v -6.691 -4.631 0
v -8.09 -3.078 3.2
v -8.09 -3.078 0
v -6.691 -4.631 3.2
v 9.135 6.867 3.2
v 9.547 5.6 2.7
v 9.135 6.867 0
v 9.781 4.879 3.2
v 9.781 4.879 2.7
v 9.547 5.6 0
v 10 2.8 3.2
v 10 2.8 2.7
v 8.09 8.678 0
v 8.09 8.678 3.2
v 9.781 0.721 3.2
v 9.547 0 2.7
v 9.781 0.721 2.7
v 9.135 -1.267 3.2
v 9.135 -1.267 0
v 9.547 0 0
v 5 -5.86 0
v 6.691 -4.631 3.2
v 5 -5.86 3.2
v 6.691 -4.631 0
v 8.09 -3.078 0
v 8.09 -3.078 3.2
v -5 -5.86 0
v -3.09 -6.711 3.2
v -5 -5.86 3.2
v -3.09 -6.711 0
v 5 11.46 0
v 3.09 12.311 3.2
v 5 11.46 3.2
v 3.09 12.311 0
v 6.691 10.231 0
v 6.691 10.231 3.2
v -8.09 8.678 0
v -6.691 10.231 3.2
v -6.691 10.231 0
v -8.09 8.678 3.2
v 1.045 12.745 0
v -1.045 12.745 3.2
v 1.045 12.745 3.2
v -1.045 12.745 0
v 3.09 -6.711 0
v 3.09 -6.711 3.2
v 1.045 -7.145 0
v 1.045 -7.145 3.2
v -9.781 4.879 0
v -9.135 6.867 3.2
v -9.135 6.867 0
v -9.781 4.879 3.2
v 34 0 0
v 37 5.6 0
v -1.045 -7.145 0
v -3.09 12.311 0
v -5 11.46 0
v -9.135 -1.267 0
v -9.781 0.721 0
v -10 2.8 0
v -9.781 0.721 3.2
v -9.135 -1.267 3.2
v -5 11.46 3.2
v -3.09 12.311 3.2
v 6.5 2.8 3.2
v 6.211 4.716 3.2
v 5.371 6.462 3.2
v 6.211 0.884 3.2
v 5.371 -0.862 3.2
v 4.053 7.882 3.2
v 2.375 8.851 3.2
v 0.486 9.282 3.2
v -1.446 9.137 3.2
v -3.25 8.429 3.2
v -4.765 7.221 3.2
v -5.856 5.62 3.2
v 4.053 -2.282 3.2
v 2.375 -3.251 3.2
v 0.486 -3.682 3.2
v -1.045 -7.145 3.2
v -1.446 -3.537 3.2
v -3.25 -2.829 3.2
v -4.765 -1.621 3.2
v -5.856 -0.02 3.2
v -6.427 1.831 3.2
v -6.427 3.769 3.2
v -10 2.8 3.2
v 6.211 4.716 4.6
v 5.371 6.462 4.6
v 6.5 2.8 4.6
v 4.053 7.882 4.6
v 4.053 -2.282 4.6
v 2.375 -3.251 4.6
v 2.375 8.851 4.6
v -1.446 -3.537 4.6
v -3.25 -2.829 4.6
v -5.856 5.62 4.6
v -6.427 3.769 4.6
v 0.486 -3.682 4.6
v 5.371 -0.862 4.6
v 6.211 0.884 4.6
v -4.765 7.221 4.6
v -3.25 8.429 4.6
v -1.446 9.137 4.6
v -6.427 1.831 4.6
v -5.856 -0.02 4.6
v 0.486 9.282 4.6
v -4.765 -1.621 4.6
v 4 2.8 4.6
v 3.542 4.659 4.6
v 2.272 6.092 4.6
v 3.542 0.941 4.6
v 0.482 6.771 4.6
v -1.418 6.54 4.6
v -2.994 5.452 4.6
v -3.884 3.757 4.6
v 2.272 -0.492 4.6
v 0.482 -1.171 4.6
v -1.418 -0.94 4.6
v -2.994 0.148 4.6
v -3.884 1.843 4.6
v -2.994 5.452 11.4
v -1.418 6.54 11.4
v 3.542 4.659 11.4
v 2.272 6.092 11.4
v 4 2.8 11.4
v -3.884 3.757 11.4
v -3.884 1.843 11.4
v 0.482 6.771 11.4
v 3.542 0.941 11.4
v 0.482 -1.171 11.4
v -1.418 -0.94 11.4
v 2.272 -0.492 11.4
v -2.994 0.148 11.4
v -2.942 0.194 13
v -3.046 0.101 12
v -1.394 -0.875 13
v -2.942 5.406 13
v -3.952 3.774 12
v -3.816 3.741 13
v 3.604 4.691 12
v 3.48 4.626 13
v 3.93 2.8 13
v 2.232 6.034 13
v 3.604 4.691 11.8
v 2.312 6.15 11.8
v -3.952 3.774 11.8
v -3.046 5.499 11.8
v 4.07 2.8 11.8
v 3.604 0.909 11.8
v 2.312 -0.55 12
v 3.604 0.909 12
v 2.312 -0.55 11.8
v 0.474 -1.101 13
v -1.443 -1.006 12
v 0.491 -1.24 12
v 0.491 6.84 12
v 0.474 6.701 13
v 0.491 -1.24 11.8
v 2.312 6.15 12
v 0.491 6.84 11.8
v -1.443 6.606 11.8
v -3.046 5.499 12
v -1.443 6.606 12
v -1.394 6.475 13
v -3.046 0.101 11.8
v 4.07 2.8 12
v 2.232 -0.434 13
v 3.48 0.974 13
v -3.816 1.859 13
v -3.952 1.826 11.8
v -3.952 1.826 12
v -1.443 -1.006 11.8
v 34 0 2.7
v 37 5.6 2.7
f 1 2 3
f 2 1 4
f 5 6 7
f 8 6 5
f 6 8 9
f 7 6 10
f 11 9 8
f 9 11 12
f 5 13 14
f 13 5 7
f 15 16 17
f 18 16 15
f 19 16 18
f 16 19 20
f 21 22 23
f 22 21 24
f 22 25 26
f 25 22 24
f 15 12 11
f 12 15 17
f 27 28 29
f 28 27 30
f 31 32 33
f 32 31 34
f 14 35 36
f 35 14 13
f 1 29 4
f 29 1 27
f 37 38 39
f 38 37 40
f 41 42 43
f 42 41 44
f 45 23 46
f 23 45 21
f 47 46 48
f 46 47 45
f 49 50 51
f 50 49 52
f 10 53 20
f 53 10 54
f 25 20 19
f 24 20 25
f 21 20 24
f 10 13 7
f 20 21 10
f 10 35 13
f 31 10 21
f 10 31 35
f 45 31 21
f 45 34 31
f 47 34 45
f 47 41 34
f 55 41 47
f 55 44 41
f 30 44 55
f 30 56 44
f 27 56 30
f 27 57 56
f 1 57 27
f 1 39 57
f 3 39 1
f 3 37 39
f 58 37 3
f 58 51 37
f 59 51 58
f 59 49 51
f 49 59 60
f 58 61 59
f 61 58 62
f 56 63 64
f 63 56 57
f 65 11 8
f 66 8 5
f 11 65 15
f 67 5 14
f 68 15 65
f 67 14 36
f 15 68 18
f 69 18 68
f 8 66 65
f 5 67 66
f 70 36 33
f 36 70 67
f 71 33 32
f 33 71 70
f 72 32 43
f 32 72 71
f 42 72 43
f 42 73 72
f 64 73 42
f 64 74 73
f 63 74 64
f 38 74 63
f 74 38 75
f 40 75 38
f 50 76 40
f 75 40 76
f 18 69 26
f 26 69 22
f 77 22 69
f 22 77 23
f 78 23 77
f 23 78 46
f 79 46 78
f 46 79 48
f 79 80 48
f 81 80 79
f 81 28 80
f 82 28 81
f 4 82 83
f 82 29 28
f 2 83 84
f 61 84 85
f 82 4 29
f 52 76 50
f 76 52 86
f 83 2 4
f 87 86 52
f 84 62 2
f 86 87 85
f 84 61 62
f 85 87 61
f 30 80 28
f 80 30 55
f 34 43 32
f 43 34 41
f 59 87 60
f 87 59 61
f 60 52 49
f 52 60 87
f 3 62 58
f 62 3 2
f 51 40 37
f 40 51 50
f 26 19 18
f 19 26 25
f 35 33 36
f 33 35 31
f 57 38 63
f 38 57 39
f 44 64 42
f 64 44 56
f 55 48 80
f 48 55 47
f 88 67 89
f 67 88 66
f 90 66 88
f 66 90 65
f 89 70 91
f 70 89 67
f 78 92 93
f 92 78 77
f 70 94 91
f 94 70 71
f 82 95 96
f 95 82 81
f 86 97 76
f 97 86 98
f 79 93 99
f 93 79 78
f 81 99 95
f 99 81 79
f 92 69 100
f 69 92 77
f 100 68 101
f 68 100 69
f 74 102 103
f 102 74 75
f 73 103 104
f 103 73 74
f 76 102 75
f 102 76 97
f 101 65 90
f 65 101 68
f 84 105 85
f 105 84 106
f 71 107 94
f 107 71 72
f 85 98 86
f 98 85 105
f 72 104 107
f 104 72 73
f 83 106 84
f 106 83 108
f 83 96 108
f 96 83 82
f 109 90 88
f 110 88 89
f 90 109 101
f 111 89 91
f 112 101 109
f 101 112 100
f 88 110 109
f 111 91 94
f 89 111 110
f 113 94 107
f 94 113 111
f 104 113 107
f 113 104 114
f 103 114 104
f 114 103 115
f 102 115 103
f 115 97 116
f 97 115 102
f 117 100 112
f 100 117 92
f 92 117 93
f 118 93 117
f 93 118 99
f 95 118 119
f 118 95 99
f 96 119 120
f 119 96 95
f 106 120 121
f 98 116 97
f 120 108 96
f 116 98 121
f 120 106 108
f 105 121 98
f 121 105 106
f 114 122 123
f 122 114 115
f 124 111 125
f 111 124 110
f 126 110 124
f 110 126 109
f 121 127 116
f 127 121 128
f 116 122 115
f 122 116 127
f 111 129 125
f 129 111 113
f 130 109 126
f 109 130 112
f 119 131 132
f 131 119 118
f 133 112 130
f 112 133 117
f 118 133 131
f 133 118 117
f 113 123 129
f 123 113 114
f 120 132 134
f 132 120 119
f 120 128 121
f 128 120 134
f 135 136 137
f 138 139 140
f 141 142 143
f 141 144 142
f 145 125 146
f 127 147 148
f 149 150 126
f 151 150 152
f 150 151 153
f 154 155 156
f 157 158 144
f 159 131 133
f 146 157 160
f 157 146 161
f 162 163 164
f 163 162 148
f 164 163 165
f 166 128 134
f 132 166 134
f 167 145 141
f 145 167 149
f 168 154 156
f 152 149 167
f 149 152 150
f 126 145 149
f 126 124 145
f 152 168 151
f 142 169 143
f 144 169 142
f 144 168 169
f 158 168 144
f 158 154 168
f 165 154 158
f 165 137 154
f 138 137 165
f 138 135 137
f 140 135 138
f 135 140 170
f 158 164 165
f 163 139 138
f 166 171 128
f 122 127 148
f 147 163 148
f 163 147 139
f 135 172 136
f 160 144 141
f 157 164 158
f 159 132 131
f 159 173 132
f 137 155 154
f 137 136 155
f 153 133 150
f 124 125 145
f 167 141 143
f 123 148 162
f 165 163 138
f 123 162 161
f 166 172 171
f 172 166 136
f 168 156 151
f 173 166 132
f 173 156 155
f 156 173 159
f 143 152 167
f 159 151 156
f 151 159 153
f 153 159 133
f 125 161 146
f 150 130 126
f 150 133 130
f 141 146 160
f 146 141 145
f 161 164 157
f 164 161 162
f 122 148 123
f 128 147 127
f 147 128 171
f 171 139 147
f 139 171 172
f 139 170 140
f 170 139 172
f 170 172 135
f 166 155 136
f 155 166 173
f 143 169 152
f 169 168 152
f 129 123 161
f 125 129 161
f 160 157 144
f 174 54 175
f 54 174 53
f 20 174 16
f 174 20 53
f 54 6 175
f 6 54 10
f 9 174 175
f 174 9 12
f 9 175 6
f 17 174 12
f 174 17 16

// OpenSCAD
/*
 * CR-10S Pro wheel guide for filament: arm with wheel support part
 *
 * History
 * -------
 * v01 (2021.06.21): Initial version
 */

width1  = 37.0; // long width of trapeze
width2  = 34.0; // short width of trapeze

// Rectangle window: 3x6 mm
depth  =  5.6;
height =  2.7; /* depending filament/printer take 2.6 */

trapeze_points = [
    [ 0,  0,  0 ],
    [ width2, 0,  0 ],
    [ width1, depth, 0 ],
    [ 0, depth,  0 ],
    [ 0, 0, height ],
    [ width2, 0, height ],
    [ width1, depth, height ],
    [ 0, depth, height ]];
trapeze_faces = [
    [0, 1, 2, 3],  // bottom
    [4, 5, 1, 0],  // front
    [7, 6, 5, 4],  // top
    [5, 6, 2, 1],  // right
    [6, 7, 3, 2],  // back
    [7, 4, 0, 3]]; // left

function cumsum(values) =
    [ for (a=0, b=values[0]; a < len(values); a= a+1, b=b+values[a]) b];

module pilar() {
        round1_height = 3.2; d1=20;
        round2_height = 1.4; d2=13;
        round3_height = 6.8; d3=8;
        cylinder(h=round1_height, d=d1);
        translate([0, 0, round1_height])
            cylinder(h=round2_height, d=d2);
        translate([0, 0, round1_height + round2_height])
            cylinder(h=round3_height, d=d3);

        roundX_height = round1_height + round2_height + round3_height;
        h = [ 0.4, 0.2, 1.0 ]; z = cumsum(h);
        d3_offset = 0.14; /* 8.14 */
        hull() {
            translate([0, 0, roundX_height])
                cylinder(h=h[0], d=d3);
            translate([0, 0, roundX_height + z[0]])
                cylinder(h=h[1], d=d3+d3_offset);
            translate([0, 0, roundX_height + z[1]])
                cylinder(h=h[2], d1=d3, d2=d3-d3_offset);
        }
}

union() {
    polyhedron(trapeze_points, trapeze_faces);
    translate([0, depth/2])
        pilar();
}
